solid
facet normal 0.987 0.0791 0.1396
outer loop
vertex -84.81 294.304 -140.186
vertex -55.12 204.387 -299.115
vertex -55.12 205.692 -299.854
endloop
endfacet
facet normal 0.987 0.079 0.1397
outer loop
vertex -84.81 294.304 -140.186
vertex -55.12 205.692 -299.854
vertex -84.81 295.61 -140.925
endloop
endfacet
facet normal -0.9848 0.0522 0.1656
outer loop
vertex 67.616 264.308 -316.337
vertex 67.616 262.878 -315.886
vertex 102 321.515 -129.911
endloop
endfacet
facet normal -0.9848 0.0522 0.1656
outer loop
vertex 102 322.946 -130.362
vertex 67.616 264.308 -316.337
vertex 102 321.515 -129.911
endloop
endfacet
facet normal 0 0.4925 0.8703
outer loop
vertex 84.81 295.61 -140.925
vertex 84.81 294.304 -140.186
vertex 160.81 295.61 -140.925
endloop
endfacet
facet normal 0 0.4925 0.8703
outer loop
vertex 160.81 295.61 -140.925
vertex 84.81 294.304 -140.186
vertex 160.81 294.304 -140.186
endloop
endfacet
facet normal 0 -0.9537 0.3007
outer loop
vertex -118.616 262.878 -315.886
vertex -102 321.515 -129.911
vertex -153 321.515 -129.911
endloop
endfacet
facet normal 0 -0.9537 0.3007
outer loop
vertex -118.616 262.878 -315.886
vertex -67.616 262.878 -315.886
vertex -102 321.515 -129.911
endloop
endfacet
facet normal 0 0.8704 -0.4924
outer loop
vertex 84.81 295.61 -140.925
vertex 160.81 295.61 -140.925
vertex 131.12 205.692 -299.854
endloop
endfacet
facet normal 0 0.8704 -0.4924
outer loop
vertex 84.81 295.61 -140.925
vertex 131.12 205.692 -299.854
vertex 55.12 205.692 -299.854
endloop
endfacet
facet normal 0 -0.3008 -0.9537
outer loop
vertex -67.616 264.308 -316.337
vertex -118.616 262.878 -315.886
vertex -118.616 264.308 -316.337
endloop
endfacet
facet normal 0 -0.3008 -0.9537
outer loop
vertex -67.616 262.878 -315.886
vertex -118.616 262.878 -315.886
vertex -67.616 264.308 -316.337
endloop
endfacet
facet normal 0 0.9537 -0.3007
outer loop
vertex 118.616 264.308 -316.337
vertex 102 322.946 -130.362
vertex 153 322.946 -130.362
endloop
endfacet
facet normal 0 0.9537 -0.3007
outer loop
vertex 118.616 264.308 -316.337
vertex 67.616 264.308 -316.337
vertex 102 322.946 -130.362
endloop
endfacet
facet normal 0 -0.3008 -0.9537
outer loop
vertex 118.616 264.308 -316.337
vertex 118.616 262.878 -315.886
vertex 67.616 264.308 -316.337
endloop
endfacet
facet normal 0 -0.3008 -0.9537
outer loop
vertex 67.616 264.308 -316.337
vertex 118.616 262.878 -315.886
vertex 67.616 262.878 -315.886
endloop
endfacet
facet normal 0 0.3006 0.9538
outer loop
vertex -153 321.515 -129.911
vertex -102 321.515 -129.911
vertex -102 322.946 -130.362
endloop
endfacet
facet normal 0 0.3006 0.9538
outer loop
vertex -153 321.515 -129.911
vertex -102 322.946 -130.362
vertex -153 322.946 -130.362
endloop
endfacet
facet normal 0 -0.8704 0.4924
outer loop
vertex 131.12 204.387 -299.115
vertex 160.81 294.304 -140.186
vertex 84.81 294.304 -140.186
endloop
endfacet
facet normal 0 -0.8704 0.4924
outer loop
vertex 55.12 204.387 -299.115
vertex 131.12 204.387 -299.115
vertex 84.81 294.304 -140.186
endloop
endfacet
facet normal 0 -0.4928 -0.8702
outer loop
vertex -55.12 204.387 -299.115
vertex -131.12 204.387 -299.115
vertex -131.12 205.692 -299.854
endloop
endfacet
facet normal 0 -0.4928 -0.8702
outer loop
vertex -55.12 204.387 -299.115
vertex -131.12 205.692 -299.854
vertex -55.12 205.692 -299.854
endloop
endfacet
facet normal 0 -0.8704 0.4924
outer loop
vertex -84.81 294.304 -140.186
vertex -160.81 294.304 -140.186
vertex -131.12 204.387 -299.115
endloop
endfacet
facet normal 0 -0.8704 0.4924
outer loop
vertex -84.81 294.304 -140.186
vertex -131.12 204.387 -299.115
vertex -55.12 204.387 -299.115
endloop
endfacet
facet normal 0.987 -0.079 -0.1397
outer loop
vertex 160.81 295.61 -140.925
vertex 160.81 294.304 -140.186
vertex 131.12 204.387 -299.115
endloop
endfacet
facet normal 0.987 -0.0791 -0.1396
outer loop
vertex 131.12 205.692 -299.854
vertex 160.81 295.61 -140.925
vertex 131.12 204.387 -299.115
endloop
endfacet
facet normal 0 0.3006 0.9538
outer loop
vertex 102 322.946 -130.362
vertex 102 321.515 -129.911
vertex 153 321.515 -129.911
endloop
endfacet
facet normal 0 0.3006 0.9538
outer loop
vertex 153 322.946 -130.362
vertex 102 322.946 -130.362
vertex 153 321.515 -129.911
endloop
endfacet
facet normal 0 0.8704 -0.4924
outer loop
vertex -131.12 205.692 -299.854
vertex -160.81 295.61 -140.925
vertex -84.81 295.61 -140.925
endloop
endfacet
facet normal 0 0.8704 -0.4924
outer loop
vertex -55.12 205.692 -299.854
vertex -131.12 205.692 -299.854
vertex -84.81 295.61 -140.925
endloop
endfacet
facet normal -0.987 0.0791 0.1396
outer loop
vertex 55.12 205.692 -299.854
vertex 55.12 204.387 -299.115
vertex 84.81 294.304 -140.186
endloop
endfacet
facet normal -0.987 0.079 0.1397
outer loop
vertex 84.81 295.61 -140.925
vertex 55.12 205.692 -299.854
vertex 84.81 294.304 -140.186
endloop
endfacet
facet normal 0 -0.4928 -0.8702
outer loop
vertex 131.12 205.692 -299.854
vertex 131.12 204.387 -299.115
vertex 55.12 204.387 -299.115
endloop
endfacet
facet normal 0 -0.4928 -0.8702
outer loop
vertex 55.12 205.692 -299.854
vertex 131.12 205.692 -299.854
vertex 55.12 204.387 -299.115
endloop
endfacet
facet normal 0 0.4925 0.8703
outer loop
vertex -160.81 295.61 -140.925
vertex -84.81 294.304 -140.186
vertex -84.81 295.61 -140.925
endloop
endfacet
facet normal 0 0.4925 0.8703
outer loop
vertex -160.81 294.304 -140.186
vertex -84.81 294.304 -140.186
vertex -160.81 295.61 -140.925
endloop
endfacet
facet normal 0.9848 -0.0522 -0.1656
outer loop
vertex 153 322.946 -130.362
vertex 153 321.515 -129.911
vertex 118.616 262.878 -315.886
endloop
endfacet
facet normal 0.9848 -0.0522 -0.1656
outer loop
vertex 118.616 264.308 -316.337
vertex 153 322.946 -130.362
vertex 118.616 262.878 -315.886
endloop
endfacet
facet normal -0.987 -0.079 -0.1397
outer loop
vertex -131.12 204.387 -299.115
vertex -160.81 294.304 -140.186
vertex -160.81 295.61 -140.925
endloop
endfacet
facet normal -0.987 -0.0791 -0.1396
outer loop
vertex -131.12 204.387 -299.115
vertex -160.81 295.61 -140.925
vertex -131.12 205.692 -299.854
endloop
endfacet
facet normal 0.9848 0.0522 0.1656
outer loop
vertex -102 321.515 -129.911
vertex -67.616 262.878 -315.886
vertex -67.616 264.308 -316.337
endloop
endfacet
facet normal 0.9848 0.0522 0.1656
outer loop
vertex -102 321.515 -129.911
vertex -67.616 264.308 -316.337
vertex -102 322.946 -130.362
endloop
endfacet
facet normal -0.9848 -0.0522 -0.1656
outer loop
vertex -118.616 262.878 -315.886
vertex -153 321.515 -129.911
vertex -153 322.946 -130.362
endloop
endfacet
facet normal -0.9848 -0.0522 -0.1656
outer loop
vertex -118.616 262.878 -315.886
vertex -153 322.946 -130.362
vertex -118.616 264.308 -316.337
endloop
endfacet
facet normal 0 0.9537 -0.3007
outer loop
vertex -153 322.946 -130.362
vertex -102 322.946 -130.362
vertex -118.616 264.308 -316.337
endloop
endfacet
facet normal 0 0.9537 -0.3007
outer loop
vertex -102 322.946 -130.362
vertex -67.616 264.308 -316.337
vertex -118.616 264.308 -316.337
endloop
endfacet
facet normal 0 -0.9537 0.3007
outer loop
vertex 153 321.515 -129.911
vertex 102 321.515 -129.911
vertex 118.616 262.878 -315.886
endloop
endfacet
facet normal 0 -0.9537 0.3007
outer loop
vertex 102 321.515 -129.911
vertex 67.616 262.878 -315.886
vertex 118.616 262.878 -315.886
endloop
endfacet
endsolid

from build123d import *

# Parameters (mm, degrees)
BOSS_EXTRUDE1_DEPTH = 1.5
BOSS_EXTRUDE2_DEPTH = 1.5


with BuildPart() as part:
    # Sketch1 → Boss-Extrude1 (new body)
    with BuildSketch(Plane(origin=(0, 329.699604605, -103.953886026), x_dir=(1, 0, 0), z_dir=(0, 0.953716951, -0.3007058))):
        Polygon((102, 27.217157705), (153, 27.217157705), (118.616238762, 222.217157705), (67.616238762, 222.217157705), align=None)
    extrude(amount=BOSS_EXTRUDE1_DEPTH)


with BuildPart() as body_2:
    # Sketch2 → Boss-Extrude2 (new body)
    with BuildSketch(Plane(origin=(0, 283.022482375, -160.126416143), x_dir=(1, 0, 0), z_dir=(0, -0.870355696, 0.49242356))):
        Polygon((84.810060817, 22.910464575), (160.810060817, 22.910464575), (131.12, -159.691562491), (55.12, -159.691562491), align=None)
    extrude(amount=-BOSS_EXTRUDE2_DEPTH)


with BuildPart() as body_3:
    # Mirror2: mirrored copy
    add(part.part.mirror(Plane(origin=(0, 0, 0), x_dir=(0, 0, 1), z_dir=(1, 0, 0))))


with BuildPart() as body_4:
    # Mirror2 2: mirrored copy
    add(body_2.part.mirror(Plane(origin=(0, 0, 0), x_dir=(0, 0, 1), z_dir=(1, 0, 0))))


solid = Compound([part.part, body_2.part, body_3.part, body_4.part])
